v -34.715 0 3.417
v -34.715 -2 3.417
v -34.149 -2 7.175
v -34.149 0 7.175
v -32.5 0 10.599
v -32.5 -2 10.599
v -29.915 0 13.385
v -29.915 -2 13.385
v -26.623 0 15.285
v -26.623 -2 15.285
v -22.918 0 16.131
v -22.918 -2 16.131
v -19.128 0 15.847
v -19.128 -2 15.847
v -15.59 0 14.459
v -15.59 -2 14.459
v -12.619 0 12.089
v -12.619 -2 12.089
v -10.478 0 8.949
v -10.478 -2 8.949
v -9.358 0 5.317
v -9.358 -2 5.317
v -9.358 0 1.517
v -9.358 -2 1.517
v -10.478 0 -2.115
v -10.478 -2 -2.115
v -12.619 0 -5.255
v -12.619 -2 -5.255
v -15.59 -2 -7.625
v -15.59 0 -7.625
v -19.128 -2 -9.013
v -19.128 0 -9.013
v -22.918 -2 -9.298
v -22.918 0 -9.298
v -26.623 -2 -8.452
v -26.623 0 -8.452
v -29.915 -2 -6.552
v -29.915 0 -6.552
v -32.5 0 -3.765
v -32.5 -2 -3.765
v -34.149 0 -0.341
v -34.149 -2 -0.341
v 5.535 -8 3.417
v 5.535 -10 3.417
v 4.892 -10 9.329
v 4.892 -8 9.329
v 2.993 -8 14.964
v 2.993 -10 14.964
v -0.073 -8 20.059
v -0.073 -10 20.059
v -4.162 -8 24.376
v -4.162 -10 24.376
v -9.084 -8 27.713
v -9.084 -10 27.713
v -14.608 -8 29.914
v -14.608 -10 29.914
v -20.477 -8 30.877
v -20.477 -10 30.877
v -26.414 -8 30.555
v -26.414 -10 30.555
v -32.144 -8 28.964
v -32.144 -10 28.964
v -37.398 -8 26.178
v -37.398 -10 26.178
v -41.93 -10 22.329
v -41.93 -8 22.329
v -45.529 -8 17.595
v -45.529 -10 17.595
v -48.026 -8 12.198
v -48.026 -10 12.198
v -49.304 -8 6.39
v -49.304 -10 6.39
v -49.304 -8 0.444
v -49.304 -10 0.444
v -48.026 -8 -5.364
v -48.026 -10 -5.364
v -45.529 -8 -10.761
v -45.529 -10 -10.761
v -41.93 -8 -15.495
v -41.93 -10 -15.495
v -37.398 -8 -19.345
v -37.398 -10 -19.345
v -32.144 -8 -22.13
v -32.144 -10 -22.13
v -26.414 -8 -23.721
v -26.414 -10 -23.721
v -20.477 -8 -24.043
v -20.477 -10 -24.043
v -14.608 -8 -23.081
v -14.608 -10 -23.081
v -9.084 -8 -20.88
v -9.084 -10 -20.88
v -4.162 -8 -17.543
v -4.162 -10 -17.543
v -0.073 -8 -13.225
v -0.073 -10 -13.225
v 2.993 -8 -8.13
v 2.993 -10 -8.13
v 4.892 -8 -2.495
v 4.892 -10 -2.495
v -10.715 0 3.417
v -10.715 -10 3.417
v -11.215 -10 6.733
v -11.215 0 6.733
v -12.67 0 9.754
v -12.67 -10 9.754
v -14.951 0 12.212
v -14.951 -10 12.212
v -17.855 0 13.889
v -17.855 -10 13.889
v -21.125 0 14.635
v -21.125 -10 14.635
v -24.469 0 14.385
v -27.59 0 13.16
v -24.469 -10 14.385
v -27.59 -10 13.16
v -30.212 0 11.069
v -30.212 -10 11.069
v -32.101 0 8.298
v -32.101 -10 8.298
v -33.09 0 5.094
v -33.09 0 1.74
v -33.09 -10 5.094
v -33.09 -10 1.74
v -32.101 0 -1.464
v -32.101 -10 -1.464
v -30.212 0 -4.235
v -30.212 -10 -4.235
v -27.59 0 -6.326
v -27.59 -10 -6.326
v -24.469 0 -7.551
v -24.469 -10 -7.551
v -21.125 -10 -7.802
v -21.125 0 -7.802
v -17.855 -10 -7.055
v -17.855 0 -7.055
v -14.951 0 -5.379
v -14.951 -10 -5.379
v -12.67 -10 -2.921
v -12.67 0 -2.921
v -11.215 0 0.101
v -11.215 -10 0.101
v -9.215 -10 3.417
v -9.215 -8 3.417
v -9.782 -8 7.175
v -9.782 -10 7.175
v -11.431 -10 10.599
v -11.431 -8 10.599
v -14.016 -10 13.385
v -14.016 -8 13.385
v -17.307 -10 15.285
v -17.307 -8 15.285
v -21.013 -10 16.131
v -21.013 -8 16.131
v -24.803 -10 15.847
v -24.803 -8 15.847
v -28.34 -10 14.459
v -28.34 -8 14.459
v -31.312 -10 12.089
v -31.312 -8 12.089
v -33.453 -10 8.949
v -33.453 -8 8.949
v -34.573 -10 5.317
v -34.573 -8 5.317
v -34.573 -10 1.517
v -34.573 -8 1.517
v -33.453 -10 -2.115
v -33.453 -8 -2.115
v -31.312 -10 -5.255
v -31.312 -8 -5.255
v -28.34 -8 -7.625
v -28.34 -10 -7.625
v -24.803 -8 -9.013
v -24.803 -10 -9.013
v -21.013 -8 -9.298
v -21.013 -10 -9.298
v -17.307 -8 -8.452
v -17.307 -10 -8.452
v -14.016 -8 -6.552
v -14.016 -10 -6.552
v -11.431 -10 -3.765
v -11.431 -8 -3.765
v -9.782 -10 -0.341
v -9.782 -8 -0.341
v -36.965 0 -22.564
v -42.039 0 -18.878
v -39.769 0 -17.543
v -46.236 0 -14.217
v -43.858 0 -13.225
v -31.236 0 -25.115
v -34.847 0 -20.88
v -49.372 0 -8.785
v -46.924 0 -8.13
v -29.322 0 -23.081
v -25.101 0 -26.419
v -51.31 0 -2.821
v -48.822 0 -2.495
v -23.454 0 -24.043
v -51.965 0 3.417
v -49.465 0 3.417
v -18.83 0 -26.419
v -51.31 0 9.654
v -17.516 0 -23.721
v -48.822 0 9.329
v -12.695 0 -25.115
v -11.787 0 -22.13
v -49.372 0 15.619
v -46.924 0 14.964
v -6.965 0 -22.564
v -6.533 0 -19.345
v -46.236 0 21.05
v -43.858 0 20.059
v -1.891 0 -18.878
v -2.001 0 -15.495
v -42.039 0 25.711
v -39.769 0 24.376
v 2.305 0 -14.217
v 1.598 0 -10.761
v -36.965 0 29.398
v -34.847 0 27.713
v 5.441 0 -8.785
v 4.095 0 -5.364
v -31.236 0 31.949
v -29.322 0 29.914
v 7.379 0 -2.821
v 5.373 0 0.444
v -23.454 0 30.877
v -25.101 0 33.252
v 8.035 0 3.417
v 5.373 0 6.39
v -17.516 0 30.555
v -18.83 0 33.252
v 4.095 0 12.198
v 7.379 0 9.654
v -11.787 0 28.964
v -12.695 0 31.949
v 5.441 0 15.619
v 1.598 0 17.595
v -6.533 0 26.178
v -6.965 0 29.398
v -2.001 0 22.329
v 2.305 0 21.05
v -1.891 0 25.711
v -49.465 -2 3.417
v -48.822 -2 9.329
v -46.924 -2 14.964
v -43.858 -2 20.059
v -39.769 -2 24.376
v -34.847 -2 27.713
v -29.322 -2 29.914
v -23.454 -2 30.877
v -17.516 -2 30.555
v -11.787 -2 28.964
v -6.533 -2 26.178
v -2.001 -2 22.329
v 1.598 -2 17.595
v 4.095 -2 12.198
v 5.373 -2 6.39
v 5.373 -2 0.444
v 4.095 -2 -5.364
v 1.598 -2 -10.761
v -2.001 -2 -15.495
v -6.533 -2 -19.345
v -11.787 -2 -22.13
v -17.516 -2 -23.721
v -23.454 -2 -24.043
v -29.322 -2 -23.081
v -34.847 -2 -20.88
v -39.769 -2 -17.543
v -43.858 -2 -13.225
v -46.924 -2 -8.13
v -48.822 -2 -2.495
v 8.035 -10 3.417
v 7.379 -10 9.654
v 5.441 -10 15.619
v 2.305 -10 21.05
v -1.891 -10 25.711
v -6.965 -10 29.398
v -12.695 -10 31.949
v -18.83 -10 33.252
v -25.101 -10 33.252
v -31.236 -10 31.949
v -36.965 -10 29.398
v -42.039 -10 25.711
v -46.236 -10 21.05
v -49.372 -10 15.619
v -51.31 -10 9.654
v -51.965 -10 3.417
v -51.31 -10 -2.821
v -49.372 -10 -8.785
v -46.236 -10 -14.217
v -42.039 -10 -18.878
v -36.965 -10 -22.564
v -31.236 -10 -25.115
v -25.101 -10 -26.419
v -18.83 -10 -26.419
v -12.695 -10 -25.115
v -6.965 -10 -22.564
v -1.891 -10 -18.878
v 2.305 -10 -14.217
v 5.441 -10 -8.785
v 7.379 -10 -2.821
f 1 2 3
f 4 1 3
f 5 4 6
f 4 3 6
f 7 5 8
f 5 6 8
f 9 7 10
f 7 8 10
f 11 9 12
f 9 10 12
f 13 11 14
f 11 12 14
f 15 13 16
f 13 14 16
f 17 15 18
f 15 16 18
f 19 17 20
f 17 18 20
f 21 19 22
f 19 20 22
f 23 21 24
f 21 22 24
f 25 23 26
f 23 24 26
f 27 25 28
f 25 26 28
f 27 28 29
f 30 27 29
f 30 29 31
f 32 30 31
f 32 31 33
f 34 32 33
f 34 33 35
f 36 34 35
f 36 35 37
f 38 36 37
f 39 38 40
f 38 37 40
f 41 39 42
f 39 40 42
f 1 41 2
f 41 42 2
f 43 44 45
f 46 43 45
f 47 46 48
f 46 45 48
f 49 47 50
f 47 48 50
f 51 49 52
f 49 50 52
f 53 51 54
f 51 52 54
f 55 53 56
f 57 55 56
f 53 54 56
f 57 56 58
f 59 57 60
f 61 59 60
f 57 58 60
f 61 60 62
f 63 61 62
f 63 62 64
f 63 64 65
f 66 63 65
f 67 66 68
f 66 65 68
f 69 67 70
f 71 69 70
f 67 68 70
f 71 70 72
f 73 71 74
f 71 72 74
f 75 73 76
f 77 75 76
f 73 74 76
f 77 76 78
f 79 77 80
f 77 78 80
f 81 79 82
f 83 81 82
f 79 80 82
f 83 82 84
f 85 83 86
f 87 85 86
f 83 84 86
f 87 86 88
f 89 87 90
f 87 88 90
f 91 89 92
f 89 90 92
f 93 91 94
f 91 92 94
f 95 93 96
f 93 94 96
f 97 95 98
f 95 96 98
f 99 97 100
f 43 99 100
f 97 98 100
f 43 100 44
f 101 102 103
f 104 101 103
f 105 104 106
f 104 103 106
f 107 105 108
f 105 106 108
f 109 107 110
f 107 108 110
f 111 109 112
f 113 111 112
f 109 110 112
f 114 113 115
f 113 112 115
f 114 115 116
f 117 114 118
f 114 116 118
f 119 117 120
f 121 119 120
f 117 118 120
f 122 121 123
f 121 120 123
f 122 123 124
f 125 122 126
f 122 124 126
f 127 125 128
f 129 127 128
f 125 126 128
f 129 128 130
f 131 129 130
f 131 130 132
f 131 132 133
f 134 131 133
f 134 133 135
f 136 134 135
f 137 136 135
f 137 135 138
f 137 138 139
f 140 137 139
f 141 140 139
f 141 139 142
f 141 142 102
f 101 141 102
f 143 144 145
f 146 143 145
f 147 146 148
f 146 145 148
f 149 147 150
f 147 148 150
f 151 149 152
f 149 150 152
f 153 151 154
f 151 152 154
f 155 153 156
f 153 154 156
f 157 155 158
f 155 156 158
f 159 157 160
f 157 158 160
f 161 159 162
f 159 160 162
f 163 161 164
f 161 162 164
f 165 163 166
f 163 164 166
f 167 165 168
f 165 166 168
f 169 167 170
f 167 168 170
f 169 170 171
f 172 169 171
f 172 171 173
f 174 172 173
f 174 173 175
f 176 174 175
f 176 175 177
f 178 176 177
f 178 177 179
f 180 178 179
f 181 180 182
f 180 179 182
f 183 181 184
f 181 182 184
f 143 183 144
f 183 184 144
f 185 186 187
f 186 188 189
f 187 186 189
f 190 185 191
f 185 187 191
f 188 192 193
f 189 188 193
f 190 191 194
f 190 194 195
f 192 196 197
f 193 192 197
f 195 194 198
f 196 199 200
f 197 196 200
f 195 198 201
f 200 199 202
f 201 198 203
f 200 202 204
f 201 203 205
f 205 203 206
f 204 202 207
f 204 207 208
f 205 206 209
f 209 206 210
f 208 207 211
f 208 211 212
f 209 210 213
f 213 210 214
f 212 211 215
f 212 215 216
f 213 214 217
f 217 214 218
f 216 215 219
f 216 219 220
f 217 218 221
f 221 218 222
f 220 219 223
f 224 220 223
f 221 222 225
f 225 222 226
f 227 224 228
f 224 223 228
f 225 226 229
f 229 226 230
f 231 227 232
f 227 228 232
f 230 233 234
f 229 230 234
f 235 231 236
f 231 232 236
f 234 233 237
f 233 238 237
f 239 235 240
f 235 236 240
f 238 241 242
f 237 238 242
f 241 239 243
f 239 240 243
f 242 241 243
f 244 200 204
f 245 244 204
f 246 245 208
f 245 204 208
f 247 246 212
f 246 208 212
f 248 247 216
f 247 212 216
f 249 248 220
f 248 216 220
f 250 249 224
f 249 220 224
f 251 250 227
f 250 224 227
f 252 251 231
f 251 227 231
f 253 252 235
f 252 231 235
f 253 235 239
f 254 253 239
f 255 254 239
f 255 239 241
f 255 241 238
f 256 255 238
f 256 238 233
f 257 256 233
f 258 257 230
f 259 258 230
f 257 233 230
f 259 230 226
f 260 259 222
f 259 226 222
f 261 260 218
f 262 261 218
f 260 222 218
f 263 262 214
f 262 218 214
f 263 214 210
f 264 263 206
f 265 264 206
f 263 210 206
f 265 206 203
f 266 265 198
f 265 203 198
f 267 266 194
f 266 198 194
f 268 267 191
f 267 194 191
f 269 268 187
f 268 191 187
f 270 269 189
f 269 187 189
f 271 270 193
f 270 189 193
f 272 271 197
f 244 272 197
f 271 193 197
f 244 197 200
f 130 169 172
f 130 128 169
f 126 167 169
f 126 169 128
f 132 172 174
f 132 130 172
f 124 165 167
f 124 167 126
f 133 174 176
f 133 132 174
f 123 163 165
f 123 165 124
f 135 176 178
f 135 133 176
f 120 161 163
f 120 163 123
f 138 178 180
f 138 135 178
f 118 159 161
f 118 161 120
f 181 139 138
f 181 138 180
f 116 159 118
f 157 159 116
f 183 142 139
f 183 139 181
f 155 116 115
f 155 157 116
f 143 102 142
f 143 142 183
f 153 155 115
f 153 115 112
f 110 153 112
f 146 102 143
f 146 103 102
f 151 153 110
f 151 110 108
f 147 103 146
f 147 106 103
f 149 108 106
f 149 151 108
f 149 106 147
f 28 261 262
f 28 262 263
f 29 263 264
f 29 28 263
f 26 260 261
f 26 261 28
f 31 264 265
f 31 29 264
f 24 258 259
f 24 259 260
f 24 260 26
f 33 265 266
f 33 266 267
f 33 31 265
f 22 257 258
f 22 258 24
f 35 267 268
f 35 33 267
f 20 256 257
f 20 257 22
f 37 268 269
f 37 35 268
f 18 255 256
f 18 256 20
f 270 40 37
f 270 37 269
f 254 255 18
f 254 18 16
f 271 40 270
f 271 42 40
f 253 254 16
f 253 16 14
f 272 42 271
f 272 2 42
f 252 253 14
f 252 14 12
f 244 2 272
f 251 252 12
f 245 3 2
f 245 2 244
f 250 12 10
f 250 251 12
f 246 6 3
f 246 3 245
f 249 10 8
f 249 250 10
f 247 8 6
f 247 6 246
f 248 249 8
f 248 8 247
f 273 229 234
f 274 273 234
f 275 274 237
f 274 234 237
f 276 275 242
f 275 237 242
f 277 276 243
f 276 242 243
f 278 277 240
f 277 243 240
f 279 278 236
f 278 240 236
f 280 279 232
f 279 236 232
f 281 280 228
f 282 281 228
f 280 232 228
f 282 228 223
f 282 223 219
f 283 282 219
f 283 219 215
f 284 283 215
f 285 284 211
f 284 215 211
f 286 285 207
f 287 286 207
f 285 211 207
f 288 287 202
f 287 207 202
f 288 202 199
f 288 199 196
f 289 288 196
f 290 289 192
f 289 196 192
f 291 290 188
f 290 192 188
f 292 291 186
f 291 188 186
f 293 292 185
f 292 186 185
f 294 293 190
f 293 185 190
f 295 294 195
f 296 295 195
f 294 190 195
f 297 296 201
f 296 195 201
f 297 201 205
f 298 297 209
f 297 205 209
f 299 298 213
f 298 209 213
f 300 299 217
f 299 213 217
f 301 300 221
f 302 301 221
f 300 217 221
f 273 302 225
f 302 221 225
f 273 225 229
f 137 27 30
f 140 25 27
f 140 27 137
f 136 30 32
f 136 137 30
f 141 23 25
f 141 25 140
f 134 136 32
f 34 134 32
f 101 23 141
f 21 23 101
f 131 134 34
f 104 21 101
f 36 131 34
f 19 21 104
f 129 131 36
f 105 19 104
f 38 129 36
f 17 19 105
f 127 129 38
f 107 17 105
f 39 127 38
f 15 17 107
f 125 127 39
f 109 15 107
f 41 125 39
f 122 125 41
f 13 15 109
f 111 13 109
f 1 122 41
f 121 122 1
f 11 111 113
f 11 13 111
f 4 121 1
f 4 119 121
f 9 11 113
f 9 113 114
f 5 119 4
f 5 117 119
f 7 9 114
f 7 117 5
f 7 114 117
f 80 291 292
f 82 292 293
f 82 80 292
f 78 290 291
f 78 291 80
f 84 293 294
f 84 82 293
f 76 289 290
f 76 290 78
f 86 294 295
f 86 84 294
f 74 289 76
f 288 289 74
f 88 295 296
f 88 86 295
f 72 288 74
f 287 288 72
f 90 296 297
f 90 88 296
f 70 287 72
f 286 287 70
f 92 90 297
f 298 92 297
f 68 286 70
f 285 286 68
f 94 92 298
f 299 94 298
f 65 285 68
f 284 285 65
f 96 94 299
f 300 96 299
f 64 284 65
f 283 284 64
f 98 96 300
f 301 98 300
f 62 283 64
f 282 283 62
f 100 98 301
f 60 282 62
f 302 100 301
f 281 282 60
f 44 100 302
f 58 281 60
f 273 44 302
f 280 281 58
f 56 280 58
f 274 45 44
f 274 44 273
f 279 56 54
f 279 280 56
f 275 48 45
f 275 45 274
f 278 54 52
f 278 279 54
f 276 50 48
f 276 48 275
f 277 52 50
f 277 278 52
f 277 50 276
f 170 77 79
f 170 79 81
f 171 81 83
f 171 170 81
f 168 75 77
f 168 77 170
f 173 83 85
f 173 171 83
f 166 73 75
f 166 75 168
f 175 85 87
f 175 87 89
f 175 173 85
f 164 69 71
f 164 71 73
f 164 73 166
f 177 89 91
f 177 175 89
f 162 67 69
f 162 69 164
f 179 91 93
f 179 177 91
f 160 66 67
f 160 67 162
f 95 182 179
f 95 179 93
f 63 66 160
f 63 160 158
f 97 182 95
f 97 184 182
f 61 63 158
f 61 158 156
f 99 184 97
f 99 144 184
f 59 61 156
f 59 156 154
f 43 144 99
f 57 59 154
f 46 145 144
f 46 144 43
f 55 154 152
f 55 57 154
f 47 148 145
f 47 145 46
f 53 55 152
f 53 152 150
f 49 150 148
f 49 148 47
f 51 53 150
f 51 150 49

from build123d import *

# Parameters (mm, degrees)
F0_R      = 30
F1_DEPTH  = 10
F2_R      = 27.5
F3_DEPTH  = 2
F4_R      = 27.5
F5_DEPTH  = 2
F6_R      = 12.75
F7_DEPTH  = 2
F8_R      = 12.75
F9_DEPTH  = 2
F10_R     = 11.25
F11_DEPTH = 10.001


with BuildPart() as f1:
    # F0 (on Front) → F1 (new body)
    with BuildSketch(Plane.XZ):
        with Locations((-21.965394, 3.416839)):
            Circle(F0_R)
    extrude(amount=F1_DEPTH)

    # F2 (on face) → F3 (cut)
    with BuildSketch(Plane.XZ.offset(10)):
        with Locations((-21.965394, 3.416839)):
            Circle(F2_R)
    extrude(amount=-F3_DEPTH, mode=Mode.SUBTRACT)

    # F4 (on face) → F5 (cut)
    with BuildSketch(Plane(origin=(0, 0, 0), x_dir=(-1, 0, 0), z_dir=(0, 1, 0))):
        with Locations((21.965394, 3.416839)):
            Circle(F4_R)
    extrude(amount=-F5_DEPTH, mode=Mode.SUBTRACT)

    # F6 (on face) → F7 (join)
    with BuildSketch(Plane(origin=(0, -2, 0), x_dir=(-1, 0, 0), z_dir=(0, 1, 0))):
        with Locations((21.965394, 3.416839)):
            Circle(F6_R)
    extrude(amount=F7_DEPTH)

    # F8 (on face) → F9 (join)
    with BuildSketch(Plane.XZ.offset(8)):
        with Locations((-21.965394, 3.416839)):
            Circle(F8_R)
    extrude(amount=F9_DEPTH)

    # F10 (on face) → F11 (cut, through all)
    with BuildSketch(Plane.XZ.offset(10)):
        with Locations((-21.965394, 3.416839)):
            Circle(F10_R)
    extrude(amount=-F11_DEPTH, mode=Mode.SUBTRACT)


solid = f1.part
